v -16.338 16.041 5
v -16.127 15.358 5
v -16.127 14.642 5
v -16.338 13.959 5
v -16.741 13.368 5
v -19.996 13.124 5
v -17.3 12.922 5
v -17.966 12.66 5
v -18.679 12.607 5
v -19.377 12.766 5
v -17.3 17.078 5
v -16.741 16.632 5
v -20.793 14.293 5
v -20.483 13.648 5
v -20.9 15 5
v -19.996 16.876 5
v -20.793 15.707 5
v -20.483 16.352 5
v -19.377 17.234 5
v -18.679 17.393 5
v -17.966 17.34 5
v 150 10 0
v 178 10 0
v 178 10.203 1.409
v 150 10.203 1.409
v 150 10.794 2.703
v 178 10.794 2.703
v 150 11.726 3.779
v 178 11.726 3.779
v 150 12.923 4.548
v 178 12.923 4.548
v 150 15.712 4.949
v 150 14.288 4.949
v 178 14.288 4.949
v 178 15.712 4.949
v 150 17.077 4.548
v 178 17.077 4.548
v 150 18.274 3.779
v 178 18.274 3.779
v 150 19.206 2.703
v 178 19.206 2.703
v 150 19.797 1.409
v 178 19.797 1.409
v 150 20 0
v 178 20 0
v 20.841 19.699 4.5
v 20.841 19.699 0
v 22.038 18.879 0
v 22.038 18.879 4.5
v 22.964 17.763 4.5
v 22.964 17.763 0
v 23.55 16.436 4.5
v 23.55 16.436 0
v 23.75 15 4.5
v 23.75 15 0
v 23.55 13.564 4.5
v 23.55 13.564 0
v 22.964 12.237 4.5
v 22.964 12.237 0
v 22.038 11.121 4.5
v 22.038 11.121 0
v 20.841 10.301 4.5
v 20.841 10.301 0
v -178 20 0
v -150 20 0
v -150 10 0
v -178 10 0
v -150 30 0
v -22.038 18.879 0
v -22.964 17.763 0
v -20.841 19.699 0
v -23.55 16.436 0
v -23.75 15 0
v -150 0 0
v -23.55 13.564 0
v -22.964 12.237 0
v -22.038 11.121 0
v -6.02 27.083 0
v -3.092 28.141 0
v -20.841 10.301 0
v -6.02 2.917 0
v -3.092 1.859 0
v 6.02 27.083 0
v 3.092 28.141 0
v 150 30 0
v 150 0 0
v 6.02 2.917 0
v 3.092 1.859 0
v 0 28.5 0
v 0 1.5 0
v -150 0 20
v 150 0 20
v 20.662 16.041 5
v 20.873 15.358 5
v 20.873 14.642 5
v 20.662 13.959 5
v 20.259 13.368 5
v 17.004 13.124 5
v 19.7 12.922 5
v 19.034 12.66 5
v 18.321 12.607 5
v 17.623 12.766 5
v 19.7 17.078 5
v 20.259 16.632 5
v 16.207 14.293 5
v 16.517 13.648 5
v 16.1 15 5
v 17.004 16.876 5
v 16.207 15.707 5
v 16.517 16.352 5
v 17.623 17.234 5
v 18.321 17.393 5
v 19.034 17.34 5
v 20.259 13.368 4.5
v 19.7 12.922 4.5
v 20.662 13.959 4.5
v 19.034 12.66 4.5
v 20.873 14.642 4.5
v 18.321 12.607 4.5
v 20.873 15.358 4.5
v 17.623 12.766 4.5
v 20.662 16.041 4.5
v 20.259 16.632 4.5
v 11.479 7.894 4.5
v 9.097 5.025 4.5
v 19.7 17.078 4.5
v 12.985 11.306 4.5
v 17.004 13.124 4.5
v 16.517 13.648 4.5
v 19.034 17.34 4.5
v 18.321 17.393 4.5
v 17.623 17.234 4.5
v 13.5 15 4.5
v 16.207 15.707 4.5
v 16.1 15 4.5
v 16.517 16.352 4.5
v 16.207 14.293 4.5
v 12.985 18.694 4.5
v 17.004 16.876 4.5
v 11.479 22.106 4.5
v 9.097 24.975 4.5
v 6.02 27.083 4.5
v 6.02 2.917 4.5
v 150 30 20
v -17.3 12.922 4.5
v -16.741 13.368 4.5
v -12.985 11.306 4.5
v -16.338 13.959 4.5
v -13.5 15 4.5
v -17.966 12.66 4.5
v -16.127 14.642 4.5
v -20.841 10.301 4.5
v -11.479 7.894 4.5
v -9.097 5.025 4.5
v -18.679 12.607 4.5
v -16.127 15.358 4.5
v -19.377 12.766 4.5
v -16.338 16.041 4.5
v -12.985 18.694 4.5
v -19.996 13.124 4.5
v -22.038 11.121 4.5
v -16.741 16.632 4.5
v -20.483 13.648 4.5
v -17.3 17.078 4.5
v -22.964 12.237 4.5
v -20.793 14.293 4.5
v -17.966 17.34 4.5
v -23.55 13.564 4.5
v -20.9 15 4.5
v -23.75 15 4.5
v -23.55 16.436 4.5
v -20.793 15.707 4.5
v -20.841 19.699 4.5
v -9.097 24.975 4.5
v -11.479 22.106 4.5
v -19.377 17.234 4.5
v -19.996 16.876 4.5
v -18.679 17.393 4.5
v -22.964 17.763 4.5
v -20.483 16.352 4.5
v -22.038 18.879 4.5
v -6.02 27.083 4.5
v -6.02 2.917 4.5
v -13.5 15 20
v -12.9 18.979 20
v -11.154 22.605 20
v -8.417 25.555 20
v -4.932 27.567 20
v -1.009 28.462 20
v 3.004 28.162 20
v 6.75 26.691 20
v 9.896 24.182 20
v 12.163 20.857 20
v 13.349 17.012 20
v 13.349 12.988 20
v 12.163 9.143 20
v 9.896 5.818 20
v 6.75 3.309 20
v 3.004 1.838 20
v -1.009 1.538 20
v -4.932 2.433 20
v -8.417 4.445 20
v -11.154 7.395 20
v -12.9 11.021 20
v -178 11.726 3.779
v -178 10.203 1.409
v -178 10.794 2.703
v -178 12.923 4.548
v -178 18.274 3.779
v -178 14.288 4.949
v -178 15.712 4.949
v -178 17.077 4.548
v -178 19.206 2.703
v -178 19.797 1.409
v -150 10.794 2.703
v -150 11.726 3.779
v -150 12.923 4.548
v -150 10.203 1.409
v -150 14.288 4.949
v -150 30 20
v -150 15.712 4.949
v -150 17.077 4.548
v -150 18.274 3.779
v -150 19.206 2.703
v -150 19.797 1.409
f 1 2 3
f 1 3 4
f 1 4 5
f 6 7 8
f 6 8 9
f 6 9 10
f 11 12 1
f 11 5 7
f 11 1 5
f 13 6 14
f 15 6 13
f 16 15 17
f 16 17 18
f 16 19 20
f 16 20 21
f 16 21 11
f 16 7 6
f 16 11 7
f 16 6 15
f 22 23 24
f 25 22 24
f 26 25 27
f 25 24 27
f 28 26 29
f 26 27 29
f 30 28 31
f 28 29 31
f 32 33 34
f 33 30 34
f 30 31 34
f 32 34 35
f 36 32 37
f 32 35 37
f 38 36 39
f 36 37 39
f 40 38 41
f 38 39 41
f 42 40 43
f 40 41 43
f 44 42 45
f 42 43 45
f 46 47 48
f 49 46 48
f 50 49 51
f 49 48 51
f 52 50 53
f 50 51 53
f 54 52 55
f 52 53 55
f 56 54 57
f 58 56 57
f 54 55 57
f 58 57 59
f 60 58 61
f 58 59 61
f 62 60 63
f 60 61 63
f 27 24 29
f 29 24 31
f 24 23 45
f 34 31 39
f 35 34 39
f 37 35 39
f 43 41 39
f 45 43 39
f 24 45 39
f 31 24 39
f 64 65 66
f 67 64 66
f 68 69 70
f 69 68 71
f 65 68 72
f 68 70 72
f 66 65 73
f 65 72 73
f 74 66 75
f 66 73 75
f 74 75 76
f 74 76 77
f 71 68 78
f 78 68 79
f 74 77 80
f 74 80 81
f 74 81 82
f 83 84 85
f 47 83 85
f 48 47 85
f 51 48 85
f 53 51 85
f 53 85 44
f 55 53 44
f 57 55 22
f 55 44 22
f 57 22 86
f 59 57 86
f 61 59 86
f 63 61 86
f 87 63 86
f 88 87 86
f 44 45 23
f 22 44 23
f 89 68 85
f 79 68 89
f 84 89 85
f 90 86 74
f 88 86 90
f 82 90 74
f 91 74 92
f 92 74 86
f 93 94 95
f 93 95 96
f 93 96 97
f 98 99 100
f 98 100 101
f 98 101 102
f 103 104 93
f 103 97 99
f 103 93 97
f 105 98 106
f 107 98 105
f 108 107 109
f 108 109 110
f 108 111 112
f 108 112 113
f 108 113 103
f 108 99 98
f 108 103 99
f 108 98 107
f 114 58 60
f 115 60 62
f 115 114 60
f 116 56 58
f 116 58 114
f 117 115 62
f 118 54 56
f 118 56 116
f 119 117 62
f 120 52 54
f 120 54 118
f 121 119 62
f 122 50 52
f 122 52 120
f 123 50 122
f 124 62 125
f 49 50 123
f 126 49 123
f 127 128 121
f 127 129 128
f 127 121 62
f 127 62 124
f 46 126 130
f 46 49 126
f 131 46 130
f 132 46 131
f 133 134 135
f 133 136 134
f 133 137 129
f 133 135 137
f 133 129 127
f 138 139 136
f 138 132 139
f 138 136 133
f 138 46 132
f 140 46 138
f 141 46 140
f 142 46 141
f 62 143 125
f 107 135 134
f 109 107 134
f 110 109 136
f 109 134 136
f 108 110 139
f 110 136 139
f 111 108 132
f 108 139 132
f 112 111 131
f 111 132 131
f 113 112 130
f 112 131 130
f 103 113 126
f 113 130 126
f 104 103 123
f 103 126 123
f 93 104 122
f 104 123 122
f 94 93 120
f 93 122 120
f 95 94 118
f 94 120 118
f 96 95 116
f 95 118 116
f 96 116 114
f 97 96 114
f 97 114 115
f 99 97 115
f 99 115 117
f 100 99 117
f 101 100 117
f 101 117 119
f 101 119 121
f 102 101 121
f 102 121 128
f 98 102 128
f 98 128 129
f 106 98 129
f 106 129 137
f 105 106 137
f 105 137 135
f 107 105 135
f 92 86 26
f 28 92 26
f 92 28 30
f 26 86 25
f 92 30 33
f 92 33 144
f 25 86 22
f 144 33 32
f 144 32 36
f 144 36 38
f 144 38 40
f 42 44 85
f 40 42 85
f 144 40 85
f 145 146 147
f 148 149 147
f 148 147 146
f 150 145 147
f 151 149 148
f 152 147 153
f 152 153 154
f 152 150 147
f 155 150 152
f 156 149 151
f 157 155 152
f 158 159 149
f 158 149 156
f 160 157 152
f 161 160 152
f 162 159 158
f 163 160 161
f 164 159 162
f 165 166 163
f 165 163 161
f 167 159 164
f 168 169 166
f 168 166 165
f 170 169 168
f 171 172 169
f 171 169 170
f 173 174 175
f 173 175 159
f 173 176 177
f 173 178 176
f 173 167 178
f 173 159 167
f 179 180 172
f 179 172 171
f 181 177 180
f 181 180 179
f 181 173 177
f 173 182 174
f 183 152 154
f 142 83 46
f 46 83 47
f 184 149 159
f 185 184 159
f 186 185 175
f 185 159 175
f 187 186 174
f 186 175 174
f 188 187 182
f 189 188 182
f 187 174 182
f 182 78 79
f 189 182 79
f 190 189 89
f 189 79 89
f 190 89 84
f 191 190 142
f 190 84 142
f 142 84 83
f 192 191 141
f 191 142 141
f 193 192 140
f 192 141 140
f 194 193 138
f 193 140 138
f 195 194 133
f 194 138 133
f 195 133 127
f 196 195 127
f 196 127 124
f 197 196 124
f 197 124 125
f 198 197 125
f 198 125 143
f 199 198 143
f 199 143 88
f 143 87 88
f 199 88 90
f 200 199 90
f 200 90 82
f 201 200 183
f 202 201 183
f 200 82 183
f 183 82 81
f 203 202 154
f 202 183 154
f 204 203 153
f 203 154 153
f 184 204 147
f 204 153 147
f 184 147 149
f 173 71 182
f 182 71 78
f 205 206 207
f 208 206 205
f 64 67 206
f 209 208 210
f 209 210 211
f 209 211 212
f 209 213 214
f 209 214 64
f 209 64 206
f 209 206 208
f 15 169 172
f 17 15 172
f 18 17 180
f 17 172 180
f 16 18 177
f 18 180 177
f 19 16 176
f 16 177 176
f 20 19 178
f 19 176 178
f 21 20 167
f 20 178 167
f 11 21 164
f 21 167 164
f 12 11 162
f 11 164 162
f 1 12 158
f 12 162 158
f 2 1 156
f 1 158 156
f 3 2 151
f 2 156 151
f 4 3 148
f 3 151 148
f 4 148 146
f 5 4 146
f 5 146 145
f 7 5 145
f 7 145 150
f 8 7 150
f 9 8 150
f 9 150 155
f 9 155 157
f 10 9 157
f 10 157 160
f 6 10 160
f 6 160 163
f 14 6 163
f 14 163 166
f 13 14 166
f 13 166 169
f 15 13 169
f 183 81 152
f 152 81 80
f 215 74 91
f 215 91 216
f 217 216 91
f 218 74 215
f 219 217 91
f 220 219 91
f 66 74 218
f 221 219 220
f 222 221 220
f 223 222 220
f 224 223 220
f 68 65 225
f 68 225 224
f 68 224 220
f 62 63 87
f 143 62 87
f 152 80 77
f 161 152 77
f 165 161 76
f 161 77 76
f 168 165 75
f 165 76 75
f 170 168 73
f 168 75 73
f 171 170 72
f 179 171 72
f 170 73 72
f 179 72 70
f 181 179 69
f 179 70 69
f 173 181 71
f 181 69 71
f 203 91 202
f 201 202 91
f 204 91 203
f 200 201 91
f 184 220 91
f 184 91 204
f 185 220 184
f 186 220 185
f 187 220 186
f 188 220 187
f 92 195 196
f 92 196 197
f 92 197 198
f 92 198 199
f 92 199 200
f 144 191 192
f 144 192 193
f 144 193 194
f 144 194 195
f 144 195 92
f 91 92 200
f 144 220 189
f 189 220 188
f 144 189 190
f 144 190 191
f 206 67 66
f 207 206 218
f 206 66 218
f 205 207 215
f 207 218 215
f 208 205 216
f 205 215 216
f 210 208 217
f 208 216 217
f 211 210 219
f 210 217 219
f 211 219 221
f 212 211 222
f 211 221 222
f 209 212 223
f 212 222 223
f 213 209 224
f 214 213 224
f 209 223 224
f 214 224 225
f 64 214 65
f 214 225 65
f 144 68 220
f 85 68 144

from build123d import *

# Parameters (mm, degrees)
SKETCH_1_W           = 300
SKETCH_1_H           = 30
EXTRUDE_1_DEPTH      = 20
EXTRUDE_2_DEPTH      = 28
EXTRUDE_2_DEPTH_BACK = 328
SKETCH_3_R           = 4
CUT_EXTRUDE_1_DEPTH  = 182.614977356
SKETCH_3_3_R         = 6
SKETCH_3_3_R_2       = 4
CUT_EXTRUDE_2_DEPTH  = 182.614977356
SKETCH_3_4_R         = 13.5
SKETCH_3_4_R_2       = 6
CUT_EXTRUDE_3_DEPTH  = 182.614977356
SKETCH_3_5_R         = 2.4
CUT_EXTRUDE_4_DEPTH  = 4.5
SKETCH_3_6_R         = 2.4
CUT_EXTRUDE_5_DEPTH  = 5


with BuildPart() as part:
    # 草图1 → 凸台-拉伸1 (new body)
    with BuildSketch(Plane.XY):
        with Locations((0, 15)):
            Rectangle(SKETCH_1_W, SKETCH_1_H)
    extrude(amount=EXTRUDE_1_DEPTH)

    # 草图2 → 凸台-拉伸2 (add, two sides: drawn at the far end of the back side and taken through both)
    with BuildSketch(Plane.ZY.offset(150).offset(-EXTRUDE_2_DEPTH_BACK)):
        with BuildLine():
            Line((0, 20), (0, 10))
            ThreePointArc((0, 10), (5, 15), (0, 20))
        make_face()
    extrude(amount=EXTRUDE_2_DEPTH + EXTRUDE_2_DEPTH_BACK)

    # 草图3 → 切除-拉伸1 (cut, through all)
    with BuildSketch(Plane(origin=(0, 0, 0), x_dir=(-1, 0, 0), z_dir=(0, 0, -1))):
        with Locations((0, 15)):
            Circle(SKETCH_3_R)
    extrude(amount=-CUT_EXTRUDE_1_DEPTH, mode=Mode.SUBTRACT)

    # 草图3<3> → 切除-拉伸2 (cut, through all)
    with BuildSketch(Plane(origin=(0, 0, 0), x_dir=(-1, 0, 0), z_dir=(0, 0, -1))):
        with Locations((0, 15)):
            Circle(SKETCH_3_3_R)
        with Locations((0, 15)):
            Circle(SKETCH_3_3_R_2, mode=Mode.SUBTRACT)
    extrude(amount=-CUT_EXTRUDE_2_DEPTH, mode=Mode.SUBTRACT)

    # 草图3<4> → 切除-拉伸3 (cut, through all)
    with BuildSketch(Plane(origin=(0, 0, 0), x_dir=(-1, 0, 0), z_dir=(0, 0, -1))):
        with Locations((0, 15)):
            Circle(SKETCH_3_4_R)
        with Locations((0, 15)):
            Circle(SKETCH_3_4_R_2, mode=Mode.SUBTRACT)
    extrude(amount=-CUT_EXTRUDE_3_DEPTH, mode=Mode.SUBTRACT)

    # 草图3<5> → 切除-拉伸4 (cut)
    # profile 1 of 2: a face of its own
    with BuildSketch(Plane(origin=(0, 0, 0), x_dir=(-1, 0, 0), z_dir=(0, 0, -1))):
        with BuildLine():
            ThreePointArc((-6.02027027, 2.916691435), (-13.5, 15), (-6.02027027, 27.083308565))
            Line((-6.02027027, 27.083308565), (-20.841216216, 19.699064442))
            ThreePointArc((-20.841216216, 19.699064442), (-23.75, 15), (-20.841216216, 10.300935558))
            Line((-20.841216216, 10.300935558), (-6.02027027, 2.916691435))
        make_face()
        with Locations((-18.5, 15)):
            Circle(SKETCH_3_5_R, mode=Mode.SUBTRACT)
    # profile 2 of 2: a face of its own
    with BuildSketch(Plane(origin=(0, 0, 0), x_dir=(-1, 0, 0), z_dir=(0, 0, -1))):
        with BuildLine():
            Line((20.841216216, 19.699064442), (6.02027027, 27.083308565))
            ThreePointArc((6.02027027, 27.083308565), (13.5, 15), (6.02027027, 2.916691435))
            Line((6.02027027, 2.916691435), (20.841216216, 10.300935558))
            ThreePointArc((20.841216216, 10.300935558), (23.75, 15), (20.841216216, 19.699064442))
        make_face()
        with Locations((18.5, 15)):
            Circle(SKETCH_3_5_R, mode=Mode.SUBTRACT)
    extrude(amount=-CUT_EXTRUDE_4_DEPTH, mode=Mode.SUBTRACT)

    # 草图3<6> → 切除-拉伸5 (cut)
    with BuildSketch(Plane(origin=(0, 0, 0), x_dir=(-1, 0, 0), z_dir=(0, 0, -1))):
        with Locations((18.5, 15)):
            Circle(SKETCH_3_6_R)
        with Locations((-18.5, 15)):
            Circle(SKETCH_3_6_R)
    extrude(amount=-CUT_EXTRUDE_5_DEPTH, mode=Mode.SUBTRACT)


solid = part.part
